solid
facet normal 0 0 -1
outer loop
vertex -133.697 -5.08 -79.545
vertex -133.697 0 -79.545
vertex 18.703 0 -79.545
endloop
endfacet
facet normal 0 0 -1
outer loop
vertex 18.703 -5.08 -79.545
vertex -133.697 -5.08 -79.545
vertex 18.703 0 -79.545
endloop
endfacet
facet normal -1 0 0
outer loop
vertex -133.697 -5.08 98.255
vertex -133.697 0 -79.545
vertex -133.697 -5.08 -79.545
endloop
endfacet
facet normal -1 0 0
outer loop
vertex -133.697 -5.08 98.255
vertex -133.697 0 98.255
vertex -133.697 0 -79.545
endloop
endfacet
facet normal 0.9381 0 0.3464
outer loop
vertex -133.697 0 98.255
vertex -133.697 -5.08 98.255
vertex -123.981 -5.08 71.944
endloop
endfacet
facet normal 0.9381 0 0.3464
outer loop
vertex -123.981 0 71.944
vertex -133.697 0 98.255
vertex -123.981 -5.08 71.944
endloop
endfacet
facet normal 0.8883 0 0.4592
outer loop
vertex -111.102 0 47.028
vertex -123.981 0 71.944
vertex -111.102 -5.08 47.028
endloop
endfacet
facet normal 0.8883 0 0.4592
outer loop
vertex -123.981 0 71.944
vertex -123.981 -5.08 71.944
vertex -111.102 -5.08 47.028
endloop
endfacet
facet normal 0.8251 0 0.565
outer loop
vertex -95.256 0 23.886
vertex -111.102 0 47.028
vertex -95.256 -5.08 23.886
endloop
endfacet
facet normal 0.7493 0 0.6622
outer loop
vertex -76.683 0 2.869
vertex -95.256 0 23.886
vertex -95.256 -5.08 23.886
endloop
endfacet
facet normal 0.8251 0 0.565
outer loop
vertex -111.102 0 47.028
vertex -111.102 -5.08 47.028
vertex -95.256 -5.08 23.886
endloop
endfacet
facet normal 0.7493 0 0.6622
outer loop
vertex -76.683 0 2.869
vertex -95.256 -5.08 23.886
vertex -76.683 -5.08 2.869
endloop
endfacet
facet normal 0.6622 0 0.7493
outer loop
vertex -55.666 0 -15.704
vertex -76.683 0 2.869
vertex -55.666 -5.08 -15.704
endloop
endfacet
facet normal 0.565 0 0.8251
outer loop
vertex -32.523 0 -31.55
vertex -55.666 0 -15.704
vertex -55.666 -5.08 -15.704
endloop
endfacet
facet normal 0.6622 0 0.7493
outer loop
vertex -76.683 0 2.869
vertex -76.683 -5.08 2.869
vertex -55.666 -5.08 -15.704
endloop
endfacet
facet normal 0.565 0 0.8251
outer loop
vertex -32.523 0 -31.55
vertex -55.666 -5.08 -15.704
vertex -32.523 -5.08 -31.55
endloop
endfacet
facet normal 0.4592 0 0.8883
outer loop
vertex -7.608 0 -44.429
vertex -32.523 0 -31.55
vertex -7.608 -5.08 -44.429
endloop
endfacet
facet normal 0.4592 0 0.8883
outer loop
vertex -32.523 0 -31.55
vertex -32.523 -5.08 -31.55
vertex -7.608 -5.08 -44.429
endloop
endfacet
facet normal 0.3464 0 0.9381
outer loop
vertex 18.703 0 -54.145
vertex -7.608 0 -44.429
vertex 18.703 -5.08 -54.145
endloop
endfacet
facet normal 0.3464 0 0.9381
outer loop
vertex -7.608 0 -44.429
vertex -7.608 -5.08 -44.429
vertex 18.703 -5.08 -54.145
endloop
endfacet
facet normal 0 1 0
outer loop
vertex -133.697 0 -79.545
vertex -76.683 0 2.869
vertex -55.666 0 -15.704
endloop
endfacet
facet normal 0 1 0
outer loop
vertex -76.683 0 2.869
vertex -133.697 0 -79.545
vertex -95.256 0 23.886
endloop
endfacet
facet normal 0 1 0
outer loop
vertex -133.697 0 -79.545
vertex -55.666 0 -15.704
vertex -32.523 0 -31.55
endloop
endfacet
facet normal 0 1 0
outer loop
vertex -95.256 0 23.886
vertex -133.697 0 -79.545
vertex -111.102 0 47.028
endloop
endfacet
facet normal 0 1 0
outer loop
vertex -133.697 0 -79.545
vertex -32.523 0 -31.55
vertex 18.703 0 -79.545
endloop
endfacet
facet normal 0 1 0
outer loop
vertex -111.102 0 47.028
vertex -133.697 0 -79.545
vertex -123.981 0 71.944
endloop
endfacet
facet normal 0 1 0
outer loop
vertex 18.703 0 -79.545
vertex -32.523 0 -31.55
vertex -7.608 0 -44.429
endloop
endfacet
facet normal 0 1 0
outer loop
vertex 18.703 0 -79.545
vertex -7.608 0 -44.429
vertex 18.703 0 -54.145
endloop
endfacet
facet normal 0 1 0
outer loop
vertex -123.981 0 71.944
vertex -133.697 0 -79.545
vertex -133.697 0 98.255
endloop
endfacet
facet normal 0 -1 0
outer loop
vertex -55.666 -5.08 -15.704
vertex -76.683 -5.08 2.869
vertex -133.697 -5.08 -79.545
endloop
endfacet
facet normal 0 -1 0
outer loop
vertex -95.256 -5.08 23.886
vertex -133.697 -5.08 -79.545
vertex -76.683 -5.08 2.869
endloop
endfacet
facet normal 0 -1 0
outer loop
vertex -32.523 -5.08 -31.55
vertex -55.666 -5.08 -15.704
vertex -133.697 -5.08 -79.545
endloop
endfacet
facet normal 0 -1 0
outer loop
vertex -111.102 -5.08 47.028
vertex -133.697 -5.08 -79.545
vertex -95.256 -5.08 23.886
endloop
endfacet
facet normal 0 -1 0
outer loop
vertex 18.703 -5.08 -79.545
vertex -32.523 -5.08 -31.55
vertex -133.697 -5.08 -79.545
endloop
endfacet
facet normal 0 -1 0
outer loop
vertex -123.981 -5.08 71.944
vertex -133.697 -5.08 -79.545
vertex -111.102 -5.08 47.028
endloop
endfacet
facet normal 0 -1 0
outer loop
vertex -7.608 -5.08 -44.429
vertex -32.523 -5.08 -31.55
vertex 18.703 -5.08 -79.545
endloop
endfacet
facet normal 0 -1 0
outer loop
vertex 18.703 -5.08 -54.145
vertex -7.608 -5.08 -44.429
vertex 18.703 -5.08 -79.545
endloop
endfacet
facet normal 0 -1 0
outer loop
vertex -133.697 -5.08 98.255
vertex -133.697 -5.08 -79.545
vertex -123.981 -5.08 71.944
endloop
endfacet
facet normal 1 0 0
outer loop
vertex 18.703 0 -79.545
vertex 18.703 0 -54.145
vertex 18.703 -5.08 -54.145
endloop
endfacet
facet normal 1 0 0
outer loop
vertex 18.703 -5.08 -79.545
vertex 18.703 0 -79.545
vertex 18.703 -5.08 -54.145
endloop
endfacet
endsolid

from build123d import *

# Parameters (mm, degrees)
F0_W     = 152.4
F0_H     = 152.4
F1_DEPTH = 5.08
F3_DEPTH = 5.08
F4_DEPTH = 25.4


with BuildPart() as f1:
    # F0 (on Front) → F1 (new body)
    with BuildSketch(Plane.XZ):
        with Locations((-57.4968958794, 22.0549479127)):
            Rectangle(F0_W, F0_H)
    extrude(amount=F1_DEPTH)

    # F2 (on face) → F3 (cut)
    with BuildSketch(Plane.XZ.offset(5.08)):
        with BuildLine():
            Line((18.7031041206, 98.2549479127), (-133.6968958794, 98.2549479127))
            ThreePointArc((-133.6968958794, 98.2549479127), (-76.6827848193, 2.8690589728), (18.7031041206, -54.1450520873))
            Line((18.7031041206, -54.1450520873), (18.7031041206, 98.2549479127))
        make_face()
    extrude(amount=-F3_DEPTH, mode=Mode.SUBTRACT)

    # F4 (add): a face of the model
    f4_faces = [f1.faces().sort_by_distance(p)[0] for p in [
        (-57.4968958794, -2.54, -54.1450520873),
    ]]
    extrude(f4_faces, amount=F4_DEPTH)


solid = f1.part
